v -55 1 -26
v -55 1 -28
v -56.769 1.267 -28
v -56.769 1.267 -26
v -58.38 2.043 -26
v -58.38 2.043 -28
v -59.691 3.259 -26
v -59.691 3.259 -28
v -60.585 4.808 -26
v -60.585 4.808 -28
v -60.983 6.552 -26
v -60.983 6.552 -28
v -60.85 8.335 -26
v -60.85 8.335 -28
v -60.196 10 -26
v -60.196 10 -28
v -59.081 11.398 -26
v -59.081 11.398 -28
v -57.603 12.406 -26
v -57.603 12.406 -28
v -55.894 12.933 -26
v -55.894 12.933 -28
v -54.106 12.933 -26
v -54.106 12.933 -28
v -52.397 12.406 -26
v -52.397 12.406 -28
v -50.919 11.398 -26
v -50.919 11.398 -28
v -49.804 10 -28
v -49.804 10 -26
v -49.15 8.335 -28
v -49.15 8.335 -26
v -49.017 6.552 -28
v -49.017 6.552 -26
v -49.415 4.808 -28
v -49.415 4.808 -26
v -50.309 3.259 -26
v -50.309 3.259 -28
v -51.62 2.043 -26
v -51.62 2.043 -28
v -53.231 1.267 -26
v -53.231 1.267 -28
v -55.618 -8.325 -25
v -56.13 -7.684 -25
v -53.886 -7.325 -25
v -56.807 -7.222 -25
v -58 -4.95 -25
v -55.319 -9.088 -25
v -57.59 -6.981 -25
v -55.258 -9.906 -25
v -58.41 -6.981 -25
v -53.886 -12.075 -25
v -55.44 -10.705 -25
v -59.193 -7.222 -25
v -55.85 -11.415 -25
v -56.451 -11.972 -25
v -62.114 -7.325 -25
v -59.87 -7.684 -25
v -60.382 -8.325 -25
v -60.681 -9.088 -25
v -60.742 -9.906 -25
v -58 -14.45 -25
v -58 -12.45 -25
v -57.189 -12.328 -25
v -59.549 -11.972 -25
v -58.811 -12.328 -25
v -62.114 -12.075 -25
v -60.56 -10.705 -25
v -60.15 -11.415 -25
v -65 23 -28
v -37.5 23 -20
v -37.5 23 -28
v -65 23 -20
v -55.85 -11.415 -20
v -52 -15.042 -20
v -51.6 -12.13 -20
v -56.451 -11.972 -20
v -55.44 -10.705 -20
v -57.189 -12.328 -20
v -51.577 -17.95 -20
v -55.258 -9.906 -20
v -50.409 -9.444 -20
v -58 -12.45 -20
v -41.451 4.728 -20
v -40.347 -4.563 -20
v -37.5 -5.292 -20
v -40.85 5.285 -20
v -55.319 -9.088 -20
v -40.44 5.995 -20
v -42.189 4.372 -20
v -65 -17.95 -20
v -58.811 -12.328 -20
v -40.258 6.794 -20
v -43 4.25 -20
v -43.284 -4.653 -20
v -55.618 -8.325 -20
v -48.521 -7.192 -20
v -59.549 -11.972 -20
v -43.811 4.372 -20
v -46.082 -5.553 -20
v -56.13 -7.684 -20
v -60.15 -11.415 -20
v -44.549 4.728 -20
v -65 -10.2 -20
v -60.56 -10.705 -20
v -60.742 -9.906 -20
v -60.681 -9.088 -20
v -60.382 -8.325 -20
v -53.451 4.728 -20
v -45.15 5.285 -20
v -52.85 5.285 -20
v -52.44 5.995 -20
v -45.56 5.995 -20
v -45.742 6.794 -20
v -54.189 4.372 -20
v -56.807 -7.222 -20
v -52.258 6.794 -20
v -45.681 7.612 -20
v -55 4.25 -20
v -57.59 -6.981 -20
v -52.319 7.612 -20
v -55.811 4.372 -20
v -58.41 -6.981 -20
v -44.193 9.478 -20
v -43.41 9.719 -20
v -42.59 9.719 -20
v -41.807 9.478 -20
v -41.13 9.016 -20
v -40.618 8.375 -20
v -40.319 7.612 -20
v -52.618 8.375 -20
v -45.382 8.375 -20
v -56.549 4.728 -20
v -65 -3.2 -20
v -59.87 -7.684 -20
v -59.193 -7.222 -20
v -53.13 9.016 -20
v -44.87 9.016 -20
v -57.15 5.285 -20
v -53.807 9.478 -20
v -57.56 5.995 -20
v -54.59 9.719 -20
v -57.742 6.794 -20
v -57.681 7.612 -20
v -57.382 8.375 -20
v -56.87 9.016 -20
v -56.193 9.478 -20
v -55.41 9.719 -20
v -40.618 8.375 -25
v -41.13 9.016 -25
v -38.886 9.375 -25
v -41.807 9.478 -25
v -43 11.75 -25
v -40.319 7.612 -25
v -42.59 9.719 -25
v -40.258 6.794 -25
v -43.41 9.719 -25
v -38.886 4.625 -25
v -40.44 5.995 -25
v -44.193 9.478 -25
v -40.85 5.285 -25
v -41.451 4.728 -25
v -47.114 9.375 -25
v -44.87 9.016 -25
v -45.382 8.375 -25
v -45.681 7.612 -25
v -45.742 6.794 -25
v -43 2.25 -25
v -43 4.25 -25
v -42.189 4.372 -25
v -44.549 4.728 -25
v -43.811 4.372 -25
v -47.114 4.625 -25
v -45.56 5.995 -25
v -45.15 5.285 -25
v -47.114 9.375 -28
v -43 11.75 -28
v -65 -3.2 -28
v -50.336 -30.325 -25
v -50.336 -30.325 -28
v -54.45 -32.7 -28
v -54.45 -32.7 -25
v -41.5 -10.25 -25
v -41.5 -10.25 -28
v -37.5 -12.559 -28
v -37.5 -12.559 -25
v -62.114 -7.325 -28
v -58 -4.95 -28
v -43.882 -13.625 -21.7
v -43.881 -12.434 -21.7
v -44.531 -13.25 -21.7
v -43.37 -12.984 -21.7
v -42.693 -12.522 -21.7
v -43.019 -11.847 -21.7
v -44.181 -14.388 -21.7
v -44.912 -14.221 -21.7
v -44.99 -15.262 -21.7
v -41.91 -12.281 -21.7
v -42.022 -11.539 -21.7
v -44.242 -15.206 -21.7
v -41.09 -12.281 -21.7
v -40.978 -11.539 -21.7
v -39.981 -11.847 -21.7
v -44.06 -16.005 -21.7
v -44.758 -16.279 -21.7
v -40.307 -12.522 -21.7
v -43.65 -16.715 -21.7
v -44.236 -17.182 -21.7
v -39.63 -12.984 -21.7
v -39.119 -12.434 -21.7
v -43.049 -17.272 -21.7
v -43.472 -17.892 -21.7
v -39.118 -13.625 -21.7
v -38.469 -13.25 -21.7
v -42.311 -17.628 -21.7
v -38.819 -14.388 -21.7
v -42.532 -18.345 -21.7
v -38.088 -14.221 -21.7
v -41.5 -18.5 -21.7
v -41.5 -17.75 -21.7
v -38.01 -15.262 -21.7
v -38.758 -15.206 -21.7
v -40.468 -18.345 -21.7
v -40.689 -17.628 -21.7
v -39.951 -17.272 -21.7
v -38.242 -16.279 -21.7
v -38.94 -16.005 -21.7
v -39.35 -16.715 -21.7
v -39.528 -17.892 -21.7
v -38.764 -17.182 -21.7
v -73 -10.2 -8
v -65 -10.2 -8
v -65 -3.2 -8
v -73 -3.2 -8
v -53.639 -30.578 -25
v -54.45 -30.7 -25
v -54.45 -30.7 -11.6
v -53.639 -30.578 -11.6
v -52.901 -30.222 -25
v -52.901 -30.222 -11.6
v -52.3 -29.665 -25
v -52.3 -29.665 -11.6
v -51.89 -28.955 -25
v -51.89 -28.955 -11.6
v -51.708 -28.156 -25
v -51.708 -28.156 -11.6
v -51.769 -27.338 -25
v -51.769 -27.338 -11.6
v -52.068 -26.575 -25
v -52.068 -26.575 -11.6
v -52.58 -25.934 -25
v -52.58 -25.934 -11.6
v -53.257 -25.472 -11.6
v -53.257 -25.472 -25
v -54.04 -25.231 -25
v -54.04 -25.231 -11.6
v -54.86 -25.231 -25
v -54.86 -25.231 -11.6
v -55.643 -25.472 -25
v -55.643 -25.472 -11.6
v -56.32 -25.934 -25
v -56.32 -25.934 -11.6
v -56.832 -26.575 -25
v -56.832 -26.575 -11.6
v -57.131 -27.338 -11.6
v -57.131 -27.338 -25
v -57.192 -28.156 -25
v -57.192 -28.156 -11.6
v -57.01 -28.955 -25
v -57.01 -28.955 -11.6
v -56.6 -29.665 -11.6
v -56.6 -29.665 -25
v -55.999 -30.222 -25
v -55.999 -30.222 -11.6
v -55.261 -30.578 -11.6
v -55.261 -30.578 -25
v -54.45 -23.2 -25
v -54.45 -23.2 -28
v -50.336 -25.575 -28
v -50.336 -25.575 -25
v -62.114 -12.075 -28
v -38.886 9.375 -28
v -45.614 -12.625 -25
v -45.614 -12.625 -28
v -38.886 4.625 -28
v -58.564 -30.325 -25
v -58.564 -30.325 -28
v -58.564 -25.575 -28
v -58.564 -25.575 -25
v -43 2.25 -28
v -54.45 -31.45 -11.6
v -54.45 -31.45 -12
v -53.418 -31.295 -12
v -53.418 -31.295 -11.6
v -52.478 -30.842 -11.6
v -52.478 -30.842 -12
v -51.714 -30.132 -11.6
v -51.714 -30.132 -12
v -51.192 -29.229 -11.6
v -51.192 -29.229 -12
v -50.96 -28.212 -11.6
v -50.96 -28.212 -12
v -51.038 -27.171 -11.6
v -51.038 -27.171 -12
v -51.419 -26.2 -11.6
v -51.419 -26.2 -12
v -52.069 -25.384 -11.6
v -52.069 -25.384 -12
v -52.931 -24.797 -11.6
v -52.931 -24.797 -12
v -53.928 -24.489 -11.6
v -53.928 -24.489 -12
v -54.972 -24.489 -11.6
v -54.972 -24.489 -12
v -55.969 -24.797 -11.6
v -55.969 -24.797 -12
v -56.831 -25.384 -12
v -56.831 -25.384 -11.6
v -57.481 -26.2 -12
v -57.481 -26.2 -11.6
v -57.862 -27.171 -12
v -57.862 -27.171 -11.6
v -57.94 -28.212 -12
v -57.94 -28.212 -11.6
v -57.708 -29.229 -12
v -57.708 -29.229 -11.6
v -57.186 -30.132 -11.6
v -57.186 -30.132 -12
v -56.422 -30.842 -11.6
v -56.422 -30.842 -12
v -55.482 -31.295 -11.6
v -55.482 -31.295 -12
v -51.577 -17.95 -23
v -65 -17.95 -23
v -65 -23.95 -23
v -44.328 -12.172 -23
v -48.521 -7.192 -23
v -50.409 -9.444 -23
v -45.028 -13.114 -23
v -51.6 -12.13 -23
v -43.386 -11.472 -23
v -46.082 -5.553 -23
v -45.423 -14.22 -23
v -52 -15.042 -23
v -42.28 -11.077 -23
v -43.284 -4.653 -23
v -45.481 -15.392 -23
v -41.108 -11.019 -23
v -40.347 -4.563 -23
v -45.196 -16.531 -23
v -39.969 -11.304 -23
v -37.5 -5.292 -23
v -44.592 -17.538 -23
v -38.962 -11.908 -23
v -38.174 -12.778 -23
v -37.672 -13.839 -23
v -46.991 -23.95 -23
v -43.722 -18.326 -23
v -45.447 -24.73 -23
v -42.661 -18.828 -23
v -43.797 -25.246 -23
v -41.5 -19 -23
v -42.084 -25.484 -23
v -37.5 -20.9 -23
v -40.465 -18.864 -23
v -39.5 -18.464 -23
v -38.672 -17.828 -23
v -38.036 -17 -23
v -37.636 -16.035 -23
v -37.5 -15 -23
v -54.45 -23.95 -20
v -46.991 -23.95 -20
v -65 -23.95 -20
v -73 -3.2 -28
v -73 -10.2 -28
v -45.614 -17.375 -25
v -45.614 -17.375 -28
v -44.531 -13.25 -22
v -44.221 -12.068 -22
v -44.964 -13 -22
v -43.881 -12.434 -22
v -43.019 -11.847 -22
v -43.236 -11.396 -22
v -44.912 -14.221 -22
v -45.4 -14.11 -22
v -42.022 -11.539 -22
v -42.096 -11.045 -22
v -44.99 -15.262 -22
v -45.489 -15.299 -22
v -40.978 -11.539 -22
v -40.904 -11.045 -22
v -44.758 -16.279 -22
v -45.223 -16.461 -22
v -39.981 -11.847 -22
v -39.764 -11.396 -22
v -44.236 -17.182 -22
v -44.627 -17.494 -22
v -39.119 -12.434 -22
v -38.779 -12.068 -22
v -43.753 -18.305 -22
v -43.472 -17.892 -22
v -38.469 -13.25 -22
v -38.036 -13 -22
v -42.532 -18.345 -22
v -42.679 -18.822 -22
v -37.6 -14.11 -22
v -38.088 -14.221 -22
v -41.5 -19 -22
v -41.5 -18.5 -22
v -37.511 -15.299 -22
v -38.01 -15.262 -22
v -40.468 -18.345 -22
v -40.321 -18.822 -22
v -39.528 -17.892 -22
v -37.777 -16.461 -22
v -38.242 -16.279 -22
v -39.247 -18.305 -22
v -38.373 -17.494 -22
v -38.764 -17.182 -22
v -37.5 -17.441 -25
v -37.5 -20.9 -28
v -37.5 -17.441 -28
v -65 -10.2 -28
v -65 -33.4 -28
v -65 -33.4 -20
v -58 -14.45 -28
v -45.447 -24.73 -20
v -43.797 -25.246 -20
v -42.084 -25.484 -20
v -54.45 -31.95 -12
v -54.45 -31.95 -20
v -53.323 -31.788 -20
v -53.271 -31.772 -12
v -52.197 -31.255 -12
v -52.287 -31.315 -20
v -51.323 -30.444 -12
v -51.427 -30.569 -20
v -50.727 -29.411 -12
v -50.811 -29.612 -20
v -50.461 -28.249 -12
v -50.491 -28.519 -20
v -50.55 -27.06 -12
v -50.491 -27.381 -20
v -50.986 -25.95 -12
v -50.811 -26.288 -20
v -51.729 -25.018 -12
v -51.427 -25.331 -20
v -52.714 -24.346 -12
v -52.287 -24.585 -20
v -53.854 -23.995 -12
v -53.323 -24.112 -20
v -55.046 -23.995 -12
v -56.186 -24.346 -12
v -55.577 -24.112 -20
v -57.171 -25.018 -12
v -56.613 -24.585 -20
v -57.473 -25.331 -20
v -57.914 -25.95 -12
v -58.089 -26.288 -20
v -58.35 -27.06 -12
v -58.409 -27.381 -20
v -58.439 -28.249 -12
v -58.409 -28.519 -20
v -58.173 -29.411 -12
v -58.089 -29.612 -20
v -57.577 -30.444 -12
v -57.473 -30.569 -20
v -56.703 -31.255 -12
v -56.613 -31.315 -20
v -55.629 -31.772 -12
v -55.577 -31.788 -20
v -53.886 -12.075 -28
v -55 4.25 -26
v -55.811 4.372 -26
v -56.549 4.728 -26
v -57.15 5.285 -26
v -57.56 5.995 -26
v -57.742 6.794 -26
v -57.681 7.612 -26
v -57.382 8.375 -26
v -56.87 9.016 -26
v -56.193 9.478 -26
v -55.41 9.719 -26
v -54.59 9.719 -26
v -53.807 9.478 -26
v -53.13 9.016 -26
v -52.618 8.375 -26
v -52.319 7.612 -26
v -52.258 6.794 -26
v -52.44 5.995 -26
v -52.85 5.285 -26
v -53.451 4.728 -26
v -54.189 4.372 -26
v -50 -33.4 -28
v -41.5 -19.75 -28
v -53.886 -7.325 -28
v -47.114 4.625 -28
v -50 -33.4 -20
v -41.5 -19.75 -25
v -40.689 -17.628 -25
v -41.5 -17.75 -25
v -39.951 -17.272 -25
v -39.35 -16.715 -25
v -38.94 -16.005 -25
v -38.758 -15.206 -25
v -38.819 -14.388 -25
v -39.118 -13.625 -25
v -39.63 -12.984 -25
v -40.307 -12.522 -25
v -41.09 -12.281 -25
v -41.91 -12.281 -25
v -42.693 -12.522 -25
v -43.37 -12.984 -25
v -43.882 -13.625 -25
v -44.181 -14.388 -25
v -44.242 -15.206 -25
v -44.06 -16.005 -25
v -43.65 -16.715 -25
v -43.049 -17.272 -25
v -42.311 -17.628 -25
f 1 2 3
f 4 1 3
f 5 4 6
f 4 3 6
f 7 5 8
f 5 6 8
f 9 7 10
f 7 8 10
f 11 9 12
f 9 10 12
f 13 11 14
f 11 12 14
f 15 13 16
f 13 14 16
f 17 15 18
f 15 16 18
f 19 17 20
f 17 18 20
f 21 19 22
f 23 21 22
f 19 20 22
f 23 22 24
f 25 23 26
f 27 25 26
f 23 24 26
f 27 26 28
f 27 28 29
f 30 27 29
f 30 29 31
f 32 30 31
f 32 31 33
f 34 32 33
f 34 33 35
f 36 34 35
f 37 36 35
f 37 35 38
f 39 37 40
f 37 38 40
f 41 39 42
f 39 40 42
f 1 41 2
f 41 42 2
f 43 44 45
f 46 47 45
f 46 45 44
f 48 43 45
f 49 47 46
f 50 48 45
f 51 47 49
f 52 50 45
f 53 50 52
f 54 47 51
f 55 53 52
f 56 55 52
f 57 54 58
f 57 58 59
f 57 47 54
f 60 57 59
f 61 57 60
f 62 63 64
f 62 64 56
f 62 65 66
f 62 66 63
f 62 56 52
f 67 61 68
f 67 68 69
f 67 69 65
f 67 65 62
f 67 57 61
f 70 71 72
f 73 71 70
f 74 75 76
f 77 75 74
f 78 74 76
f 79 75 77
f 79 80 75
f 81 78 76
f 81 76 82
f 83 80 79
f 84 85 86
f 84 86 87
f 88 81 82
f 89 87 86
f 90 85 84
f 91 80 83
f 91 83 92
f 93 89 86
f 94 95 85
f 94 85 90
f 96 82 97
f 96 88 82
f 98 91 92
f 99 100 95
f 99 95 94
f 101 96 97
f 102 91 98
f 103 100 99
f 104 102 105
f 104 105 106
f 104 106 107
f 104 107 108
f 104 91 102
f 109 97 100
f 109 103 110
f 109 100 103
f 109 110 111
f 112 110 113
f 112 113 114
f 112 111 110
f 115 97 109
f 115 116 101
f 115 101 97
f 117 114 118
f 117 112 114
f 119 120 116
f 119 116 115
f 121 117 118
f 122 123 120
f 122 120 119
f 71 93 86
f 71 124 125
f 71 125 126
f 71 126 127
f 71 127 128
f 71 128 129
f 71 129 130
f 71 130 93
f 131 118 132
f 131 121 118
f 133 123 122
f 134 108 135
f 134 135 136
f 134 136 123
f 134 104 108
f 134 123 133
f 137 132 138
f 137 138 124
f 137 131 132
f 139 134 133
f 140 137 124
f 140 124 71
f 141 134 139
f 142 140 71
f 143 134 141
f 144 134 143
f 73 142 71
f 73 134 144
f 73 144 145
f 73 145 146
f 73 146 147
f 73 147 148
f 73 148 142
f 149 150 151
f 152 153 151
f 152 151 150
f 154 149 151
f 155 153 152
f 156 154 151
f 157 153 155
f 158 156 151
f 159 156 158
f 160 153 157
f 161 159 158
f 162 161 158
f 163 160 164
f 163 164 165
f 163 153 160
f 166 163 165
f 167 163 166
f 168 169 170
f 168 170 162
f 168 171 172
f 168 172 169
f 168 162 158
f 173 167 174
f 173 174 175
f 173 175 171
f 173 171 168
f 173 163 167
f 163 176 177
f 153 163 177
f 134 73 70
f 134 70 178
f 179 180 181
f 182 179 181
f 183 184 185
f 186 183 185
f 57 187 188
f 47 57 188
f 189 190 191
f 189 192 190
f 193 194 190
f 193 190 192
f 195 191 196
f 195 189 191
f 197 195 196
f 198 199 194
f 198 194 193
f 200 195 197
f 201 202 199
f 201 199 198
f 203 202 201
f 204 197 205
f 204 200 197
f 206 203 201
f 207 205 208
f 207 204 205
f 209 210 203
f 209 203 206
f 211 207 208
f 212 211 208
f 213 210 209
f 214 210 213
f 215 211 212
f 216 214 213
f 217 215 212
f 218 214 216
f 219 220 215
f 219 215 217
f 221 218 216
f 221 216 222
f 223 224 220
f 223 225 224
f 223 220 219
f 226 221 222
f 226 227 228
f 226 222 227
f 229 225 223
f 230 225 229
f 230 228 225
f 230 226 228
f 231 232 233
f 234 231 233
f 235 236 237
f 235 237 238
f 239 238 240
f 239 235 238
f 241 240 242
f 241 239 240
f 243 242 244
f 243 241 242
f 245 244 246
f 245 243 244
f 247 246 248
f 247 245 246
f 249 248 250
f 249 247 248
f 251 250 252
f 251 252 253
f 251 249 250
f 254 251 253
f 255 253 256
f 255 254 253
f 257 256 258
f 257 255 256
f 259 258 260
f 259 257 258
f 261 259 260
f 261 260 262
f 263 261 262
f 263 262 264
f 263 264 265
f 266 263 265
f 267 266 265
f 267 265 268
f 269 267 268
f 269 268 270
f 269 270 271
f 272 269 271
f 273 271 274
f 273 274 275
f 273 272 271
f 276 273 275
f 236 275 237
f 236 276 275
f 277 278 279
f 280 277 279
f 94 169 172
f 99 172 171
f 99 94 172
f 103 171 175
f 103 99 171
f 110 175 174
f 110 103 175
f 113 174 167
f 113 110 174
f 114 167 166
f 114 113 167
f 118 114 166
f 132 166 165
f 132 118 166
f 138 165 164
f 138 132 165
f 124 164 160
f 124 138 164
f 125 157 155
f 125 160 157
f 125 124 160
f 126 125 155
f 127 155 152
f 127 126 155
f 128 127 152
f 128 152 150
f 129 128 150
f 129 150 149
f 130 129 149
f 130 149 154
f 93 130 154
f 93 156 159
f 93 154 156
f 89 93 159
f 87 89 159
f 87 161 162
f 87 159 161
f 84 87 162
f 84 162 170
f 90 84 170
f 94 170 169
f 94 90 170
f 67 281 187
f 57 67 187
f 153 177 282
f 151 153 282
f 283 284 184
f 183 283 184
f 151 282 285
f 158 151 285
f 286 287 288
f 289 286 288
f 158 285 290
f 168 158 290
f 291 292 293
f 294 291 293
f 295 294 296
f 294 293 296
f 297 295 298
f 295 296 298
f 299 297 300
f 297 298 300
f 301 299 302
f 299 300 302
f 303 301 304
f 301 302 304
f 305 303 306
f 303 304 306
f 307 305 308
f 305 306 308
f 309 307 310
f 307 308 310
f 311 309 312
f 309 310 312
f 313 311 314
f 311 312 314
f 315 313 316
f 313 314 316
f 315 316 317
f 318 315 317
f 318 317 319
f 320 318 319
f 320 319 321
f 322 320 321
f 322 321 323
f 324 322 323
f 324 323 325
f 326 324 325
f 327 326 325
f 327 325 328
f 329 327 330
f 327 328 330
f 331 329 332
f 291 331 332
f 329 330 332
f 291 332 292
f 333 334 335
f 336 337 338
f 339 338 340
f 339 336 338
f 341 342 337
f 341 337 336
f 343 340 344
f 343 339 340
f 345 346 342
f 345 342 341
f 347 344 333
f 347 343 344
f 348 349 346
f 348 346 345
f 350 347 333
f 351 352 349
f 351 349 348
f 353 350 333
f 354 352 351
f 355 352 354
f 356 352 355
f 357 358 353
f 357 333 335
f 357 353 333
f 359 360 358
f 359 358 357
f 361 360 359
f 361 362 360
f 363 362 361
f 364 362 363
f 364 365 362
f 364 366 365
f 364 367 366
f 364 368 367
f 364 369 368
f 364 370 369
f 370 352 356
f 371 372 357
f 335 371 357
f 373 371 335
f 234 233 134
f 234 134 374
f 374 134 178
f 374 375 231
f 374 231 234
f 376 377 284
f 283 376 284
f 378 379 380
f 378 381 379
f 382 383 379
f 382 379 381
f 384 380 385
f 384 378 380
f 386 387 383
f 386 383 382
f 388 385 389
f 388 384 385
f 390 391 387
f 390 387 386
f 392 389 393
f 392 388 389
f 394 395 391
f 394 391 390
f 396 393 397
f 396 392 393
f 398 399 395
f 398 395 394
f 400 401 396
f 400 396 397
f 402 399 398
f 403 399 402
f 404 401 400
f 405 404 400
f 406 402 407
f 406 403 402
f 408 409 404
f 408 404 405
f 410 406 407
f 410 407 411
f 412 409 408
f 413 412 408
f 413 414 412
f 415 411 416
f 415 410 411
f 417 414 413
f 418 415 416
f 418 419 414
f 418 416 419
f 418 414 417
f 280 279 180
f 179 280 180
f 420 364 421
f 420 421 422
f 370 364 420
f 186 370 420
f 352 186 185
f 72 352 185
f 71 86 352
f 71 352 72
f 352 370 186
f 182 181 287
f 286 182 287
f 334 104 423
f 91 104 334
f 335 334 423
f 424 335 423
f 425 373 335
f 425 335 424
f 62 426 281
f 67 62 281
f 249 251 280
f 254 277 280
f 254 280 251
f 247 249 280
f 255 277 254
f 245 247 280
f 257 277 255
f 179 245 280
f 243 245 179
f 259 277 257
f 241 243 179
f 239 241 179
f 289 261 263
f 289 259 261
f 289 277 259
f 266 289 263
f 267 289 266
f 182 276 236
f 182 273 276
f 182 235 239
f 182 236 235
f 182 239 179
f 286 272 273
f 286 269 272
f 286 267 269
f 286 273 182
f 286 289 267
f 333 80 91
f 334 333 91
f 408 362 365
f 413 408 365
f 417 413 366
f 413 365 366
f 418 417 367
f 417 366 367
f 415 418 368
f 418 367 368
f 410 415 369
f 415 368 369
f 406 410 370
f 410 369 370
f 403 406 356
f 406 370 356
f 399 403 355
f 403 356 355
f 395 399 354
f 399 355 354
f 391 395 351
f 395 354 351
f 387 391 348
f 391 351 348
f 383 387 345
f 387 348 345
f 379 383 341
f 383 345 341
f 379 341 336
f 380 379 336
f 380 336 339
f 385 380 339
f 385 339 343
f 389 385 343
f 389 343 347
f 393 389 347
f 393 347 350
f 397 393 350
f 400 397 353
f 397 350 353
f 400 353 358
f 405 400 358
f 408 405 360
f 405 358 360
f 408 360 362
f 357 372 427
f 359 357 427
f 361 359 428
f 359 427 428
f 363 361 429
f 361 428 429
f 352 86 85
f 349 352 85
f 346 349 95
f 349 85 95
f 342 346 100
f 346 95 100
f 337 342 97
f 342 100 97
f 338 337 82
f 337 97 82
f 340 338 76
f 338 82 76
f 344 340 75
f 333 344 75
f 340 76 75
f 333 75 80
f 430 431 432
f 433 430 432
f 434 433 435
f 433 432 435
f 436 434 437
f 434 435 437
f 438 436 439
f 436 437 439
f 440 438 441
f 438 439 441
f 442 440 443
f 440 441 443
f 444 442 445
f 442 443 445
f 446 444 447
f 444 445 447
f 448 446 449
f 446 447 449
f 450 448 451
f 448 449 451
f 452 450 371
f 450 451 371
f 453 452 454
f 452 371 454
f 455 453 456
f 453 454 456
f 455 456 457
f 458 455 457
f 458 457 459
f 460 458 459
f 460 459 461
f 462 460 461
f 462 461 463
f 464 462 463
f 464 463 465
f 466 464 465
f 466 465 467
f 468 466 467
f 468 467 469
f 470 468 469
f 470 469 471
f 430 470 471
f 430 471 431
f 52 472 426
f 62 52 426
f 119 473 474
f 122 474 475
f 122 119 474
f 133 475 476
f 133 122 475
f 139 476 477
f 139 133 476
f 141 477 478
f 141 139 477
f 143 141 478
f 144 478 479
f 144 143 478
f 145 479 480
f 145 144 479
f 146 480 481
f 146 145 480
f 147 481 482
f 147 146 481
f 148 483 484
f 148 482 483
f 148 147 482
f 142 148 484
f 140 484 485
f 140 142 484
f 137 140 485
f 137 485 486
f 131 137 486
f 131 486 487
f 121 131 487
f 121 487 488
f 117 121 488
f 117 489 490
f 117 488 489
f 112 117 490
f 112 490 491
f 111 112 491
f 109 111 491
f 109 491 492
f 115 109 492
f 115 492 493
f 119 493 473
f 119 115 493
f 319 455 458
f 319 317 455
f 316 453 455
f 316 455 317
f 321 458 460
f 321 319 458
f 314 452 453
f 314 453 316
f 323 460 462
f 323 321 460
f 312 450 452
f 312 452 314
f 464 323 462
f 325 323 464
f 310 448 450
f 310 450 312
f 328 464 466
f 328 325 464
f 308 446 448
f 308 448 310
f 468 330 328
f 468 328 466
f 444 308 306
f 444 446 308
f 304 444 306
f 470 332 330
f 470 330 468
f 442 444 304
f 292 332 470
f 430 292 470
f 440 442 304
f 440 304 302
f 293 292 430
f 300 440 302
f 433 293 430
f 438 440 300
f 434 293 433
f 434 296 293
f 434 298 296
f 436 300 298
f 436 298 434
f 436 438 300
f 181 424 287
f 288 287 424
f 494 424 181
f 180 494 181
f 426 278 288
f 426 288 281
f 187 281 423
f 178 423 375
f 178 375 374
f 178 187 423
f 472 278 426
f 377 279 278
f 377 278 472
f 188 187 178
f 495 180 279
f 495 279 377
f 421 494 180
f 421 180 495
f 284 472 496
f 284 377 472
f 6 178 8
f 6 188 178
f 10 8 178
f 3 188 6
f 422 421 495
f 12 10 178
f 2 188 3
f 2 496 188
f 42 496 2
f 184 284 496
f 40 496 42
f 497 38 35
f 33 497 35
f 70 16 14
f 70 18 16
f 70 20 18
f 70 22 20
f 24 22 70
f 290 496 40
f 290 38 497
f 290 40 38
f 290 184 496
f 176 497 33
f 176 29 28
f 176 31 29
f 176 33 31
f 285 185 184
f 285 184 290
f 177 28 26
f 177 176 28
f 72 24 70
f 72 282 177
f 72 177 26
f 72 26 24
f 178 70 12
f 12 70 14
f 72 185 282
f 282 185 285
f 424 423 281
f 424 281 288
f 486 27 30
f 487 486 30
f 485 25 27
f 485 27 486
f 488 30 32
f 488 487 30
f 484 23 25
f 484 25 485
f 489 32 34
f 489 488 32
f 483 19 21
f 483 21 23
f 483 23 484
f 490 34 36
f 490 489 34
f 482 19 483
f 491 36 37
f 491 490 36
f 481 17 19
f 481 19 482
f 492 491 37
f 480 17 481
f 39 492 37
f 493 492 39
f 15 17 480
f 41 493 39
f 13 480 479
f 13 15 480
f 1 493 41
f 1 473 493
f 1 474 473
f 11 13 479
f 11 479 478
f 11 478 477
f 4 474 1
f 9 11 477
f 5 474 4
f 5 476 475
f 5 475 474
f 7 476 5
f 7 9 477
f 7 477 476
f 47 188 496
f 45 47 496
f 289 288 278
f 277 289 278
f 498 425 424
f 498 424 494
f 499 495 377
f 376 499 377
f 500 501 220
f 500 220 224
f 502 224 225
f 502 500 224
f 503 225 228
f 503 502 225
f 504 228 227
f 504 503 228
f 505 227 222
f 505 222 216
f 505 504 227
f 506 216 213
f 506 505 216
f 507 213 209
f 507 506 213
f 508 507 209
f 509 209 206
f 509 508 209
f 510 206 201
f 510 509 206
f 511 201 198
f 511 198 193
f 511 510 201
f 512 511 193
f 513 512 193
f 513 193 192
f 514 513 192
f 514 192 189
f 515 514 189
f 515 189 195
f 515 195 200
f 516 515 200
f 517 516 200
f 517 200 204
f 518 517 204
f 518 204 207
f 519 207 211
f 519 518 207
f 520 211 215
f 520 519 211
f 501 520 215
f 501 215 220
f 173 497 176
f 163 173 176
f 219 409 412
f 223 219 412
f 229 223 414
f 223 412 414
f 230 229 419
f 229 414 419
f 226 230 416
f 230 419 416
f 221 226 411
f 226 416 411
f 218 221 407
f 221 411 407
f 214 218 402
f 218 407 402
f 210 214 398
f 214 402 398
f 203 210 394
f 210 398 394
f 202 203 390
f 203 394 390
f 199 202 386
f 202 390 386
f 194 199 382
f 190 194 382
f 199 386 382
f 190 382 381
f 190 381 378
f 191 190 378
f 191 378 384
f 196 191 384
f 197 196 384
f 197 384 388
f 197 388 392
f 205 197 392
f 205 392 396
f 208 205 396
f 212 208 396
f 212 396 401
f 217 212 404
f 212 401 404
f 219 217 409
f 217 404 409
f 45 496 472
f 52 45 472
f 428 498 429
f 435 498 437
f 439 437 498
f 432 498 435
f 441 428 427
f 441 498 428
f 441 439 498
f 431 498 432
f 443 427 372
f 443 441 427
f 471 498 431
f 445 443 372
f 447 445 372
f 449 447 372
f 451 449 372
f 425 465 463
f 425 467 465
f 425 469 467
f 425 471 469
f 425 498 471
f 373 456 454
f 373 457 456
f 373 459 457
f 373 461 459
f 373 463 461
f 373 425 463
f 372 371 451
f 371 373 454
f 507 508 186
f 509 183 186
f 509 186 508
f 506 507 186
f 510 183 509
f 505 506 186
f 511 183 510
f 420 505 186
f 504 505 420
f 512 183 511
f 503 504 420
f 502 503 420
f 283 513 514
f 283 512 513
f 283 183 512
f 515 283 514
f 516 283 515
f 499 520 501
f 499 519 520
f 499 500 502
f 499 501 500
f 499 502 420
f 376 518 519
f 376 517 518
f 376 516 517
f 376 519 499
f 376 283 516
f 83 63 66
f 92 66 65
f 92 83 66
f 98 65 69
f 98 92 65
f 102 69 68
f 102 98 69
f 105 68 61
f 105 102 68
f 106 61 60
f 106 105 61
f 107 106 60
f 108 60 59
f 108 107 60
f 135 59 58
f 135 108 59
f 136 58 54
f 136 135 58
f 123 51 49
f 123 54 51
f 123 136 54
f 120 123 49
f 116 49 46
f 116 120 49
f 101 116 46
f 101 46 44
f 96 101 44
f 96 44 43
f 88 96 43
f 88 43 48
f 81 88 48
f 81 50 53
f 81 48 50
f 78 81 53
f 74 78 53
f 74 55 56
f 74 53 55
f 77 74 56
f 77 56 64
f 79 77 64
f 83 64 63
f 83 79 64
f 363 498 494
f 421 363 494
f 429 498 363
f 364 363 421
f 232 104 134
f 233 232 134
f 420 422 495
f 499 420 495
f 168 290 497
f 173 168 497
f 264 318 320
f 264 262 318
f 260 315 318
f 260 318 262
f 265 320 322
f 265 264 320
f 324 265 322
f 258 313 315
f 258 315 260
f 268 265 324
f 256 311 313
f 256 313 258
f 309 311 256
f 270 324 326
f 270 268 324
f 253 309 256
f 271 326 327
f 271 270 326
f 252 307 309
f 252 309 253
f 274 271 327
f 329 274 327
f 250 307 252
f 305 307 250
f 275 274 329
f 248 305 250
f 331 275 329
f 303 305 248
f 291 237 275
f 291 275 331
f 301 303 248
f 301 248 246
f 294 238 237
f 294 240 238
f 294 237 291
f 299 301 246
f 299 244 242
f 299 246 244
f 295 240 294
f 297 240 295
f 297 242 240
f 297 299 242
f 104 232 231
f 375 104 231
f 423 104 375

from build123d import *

# Parameters (mm, degrees)
SKETCH007_R             = 2.75
PAD004_DEPTH            = 8
POCKET003_DEPTH         = 3
SKETCH022_R             = 4
SKETCH022_R_2           = 2.75
PAD015_DEPTH            = 1
SKETCH023_R             = 3.5
SKETCH023_R_2           = 2.75
PAD016_DEPTH            = 0.3
SKETCH024_R             = 4
SKETCH024_R_2           = 2.75
PAD017_DEPTH            = 8
SKETCH025_R             = 3.5
SKETCH025_R_2           = 2.75
PAD018_DEPTH            = 0.4
SKETCH026_R             = 6
POCKET005_DEPTH         = 2
POCKET006_DEPTH         = 3
SKETCH028_W             = 7
SKETCH028_H             = 20
PAD019_DEPTH            = 8
BODY001_ROLL_ANGLE      = 180
BODY001_PLACEMENT_ANGLE = -90


with BuildPart() as part:
    # Sketch007 → Pad004 (new body)
    with BuildSketch(Plane.XY):
        Polygon((0, 27.5), (56.4, 27.5), (56.4, 12.5), (43.9, 0), (0, 0), align=None)
        with Locations((16, 17.5)):
            Circle(SKETCH007_R, mode=Mode.SUBTRACT)
        with Locations((16, 5.5)):
            Circle(SKETCH007_R, mode=Mode.SUBTRACT)
        with Locations((32.7, 20.5)):
            Circle(SKETCH007_R, mode=Mode.SUBTRACT)
        with Locations((38, 4)):
            Circle(SKETCH007_R, mode=Mode.SUBTRACT)
        with Locations((50.95, 16.95)):
            Circle(SKETCH007_R, mode=Mode.SUBTRACT)
    extrude(amount=PAD004_DEPTH)

    # Sketch012 (on Face11 of Pad004) → Pocket003 (cut)
    with BuildSketch(Plane(origin=(0, 0, 0), x_dir=(1, 0, 0), z_dir=(0, 0, -1))):
        with BuildLine():
            ThreePointArc((46.95, -9.490674), (31.623381, 4.341986), (40.95, -14.077078))
            Line((40.95, -14.077078), (40.95, -49.490674))
            Line((40.95, -49.490674), (46.95, -49.490674))
            Line((46.95, -9.490674), (46.95, -49.490674))
        make_face()
    extrude(amount=-POCKET003_DEPTH, mode=Mode.SUBTRACT)

    # Sketch022 (on Face2 of Pocket003) → Pad015 (join)
    with BuildSketch(Plane(origin=(0, 0, 3), x_dir=(1, 0, 0), z_dir=(0, 0, -1))):
        with Locations((38, -4)):
            Circle(SKETCH022_R)
        with Locations((38, -4)):
            Circle(SKETCH022_R_2, mode=Mode.SUBTRACT)
    extrude(amount=PAD015_DEPTH)

    # Sketch023 (on Face19 of Pad015) → Pad016 (join)
    with BuildSketch(Plane(origin=(0, 0, 2), x_dir=(1, 0, 0), z_dir=(0, 0, -1))):
        with Locations((38, -4)):
            Circle(SKETCH023_R)
        with Locations((38, -4)):
            Circle(SKETCH023_R_2, mode=Mode.SUBTRACT)
    extrude(amount=PAD016_DEPTH)

    # Sketch024 (on Face18 of Pad016) → Pad017 (join)
    with BuildSketch(Plane(origin=(0, 0, 0), x_dir=(1, 0, 0), z_dir=(0, 0, -1))):
        with Locations((50.95, -16.95)):
            Circle(SKETCH024_R)
        with Locations((50.95, -16.95)):
            Circle(SKETCH024_R_2, mode=Mode.SUBTRACT)
    extrude(amount=PAD017_DEPTH)

    # Sketch025 (on Face23 of Pad017) → Pad018 (join)
    with BuildSketch(Plane(origin=(0, 0, -8), x_dir=(1, 0, 0), z_dir=(0, 0, -1))):
        with Locations((50.95, -16.95)):
            Circle(SKETCH025_R)
        with Locations((50.95, -16.95)):
            Circle(SKETCH025_R_2, mode=Mode.SUBTRACT)
    extrude(amount=PAD018_DEPTH)

    # Sketch026 (on Face6 of Pad018) → Pocket005 (cut)
    with BuildSketch(Plane.XY.offset(8)):
        with Locations((16, 17.5)):
            Circle(SKETCH026_R)
    extrude(amount=-POCKET005_DEPTH, mode=Mode.SUBTRACT)

    # Sketch027 (on Face6 of Pocket005) → Pocket006 (cut)
    with BuildSketch(Plane.XY.offset(8)):
        Polygon((20.75, 5.5), (18.375, 9.613621), (13.625, 9.613621), (11.25, 5.5), (13.625, 1.386379), (18.375, 1.386379), align=None)
        Polygon((37.45, 20.5), (35.075, 24.613621), (30.325, 24.613621), (27.95, 20.5), (30.325, 16.386379), (35.075, 16.386379), align=None)
        Polygon((42.75, 4), (40.375, 8.113621), (35.625, 8.113621), (33.25, 4), (35.625, -0.113621), (40.375, -0.113621), align=None)
        Polygon((55.7, 16.95), (53.325, 21.063621), (48.575, 21.063621), (46.2, 16.95), (48.575, 12.836379), (53.325, 12.836379), align=None)
    extrude(amount=-POCKET006_DEPTH, mode=Mode.SUBTRACT)

    # Sketch028 (on Face12 of Pocket006) → Pad019 (join)
    with BuildSketch(Plane(origin=(0, 27.5, 0), x_dir=(-1, 0, 0), z_dir=(0, 1, 0))):
        with Locations((-29.7, -2)):
            Rectangle(SKETCH028_W, SKETCH028_H)
    extrude(amount=PAD019_DEPTH)


with BuildPart() as part_1:
    # Body001 roll: moved
    add(part.part.rotate(Axis((0, 0, 0), (1, 0, 0)), BODY001_ROLL_ANGLE))


with BuildPart() as part_2:
    # Body001 placement: moved
    add(part_1.part.moved(Location((-37.5, 23, -20))).rotate(Axis((-37.5, 23, -20), (0, 0, 1)), BODY001_PLACEMENT_ANGLE))


solid = part_2.part
